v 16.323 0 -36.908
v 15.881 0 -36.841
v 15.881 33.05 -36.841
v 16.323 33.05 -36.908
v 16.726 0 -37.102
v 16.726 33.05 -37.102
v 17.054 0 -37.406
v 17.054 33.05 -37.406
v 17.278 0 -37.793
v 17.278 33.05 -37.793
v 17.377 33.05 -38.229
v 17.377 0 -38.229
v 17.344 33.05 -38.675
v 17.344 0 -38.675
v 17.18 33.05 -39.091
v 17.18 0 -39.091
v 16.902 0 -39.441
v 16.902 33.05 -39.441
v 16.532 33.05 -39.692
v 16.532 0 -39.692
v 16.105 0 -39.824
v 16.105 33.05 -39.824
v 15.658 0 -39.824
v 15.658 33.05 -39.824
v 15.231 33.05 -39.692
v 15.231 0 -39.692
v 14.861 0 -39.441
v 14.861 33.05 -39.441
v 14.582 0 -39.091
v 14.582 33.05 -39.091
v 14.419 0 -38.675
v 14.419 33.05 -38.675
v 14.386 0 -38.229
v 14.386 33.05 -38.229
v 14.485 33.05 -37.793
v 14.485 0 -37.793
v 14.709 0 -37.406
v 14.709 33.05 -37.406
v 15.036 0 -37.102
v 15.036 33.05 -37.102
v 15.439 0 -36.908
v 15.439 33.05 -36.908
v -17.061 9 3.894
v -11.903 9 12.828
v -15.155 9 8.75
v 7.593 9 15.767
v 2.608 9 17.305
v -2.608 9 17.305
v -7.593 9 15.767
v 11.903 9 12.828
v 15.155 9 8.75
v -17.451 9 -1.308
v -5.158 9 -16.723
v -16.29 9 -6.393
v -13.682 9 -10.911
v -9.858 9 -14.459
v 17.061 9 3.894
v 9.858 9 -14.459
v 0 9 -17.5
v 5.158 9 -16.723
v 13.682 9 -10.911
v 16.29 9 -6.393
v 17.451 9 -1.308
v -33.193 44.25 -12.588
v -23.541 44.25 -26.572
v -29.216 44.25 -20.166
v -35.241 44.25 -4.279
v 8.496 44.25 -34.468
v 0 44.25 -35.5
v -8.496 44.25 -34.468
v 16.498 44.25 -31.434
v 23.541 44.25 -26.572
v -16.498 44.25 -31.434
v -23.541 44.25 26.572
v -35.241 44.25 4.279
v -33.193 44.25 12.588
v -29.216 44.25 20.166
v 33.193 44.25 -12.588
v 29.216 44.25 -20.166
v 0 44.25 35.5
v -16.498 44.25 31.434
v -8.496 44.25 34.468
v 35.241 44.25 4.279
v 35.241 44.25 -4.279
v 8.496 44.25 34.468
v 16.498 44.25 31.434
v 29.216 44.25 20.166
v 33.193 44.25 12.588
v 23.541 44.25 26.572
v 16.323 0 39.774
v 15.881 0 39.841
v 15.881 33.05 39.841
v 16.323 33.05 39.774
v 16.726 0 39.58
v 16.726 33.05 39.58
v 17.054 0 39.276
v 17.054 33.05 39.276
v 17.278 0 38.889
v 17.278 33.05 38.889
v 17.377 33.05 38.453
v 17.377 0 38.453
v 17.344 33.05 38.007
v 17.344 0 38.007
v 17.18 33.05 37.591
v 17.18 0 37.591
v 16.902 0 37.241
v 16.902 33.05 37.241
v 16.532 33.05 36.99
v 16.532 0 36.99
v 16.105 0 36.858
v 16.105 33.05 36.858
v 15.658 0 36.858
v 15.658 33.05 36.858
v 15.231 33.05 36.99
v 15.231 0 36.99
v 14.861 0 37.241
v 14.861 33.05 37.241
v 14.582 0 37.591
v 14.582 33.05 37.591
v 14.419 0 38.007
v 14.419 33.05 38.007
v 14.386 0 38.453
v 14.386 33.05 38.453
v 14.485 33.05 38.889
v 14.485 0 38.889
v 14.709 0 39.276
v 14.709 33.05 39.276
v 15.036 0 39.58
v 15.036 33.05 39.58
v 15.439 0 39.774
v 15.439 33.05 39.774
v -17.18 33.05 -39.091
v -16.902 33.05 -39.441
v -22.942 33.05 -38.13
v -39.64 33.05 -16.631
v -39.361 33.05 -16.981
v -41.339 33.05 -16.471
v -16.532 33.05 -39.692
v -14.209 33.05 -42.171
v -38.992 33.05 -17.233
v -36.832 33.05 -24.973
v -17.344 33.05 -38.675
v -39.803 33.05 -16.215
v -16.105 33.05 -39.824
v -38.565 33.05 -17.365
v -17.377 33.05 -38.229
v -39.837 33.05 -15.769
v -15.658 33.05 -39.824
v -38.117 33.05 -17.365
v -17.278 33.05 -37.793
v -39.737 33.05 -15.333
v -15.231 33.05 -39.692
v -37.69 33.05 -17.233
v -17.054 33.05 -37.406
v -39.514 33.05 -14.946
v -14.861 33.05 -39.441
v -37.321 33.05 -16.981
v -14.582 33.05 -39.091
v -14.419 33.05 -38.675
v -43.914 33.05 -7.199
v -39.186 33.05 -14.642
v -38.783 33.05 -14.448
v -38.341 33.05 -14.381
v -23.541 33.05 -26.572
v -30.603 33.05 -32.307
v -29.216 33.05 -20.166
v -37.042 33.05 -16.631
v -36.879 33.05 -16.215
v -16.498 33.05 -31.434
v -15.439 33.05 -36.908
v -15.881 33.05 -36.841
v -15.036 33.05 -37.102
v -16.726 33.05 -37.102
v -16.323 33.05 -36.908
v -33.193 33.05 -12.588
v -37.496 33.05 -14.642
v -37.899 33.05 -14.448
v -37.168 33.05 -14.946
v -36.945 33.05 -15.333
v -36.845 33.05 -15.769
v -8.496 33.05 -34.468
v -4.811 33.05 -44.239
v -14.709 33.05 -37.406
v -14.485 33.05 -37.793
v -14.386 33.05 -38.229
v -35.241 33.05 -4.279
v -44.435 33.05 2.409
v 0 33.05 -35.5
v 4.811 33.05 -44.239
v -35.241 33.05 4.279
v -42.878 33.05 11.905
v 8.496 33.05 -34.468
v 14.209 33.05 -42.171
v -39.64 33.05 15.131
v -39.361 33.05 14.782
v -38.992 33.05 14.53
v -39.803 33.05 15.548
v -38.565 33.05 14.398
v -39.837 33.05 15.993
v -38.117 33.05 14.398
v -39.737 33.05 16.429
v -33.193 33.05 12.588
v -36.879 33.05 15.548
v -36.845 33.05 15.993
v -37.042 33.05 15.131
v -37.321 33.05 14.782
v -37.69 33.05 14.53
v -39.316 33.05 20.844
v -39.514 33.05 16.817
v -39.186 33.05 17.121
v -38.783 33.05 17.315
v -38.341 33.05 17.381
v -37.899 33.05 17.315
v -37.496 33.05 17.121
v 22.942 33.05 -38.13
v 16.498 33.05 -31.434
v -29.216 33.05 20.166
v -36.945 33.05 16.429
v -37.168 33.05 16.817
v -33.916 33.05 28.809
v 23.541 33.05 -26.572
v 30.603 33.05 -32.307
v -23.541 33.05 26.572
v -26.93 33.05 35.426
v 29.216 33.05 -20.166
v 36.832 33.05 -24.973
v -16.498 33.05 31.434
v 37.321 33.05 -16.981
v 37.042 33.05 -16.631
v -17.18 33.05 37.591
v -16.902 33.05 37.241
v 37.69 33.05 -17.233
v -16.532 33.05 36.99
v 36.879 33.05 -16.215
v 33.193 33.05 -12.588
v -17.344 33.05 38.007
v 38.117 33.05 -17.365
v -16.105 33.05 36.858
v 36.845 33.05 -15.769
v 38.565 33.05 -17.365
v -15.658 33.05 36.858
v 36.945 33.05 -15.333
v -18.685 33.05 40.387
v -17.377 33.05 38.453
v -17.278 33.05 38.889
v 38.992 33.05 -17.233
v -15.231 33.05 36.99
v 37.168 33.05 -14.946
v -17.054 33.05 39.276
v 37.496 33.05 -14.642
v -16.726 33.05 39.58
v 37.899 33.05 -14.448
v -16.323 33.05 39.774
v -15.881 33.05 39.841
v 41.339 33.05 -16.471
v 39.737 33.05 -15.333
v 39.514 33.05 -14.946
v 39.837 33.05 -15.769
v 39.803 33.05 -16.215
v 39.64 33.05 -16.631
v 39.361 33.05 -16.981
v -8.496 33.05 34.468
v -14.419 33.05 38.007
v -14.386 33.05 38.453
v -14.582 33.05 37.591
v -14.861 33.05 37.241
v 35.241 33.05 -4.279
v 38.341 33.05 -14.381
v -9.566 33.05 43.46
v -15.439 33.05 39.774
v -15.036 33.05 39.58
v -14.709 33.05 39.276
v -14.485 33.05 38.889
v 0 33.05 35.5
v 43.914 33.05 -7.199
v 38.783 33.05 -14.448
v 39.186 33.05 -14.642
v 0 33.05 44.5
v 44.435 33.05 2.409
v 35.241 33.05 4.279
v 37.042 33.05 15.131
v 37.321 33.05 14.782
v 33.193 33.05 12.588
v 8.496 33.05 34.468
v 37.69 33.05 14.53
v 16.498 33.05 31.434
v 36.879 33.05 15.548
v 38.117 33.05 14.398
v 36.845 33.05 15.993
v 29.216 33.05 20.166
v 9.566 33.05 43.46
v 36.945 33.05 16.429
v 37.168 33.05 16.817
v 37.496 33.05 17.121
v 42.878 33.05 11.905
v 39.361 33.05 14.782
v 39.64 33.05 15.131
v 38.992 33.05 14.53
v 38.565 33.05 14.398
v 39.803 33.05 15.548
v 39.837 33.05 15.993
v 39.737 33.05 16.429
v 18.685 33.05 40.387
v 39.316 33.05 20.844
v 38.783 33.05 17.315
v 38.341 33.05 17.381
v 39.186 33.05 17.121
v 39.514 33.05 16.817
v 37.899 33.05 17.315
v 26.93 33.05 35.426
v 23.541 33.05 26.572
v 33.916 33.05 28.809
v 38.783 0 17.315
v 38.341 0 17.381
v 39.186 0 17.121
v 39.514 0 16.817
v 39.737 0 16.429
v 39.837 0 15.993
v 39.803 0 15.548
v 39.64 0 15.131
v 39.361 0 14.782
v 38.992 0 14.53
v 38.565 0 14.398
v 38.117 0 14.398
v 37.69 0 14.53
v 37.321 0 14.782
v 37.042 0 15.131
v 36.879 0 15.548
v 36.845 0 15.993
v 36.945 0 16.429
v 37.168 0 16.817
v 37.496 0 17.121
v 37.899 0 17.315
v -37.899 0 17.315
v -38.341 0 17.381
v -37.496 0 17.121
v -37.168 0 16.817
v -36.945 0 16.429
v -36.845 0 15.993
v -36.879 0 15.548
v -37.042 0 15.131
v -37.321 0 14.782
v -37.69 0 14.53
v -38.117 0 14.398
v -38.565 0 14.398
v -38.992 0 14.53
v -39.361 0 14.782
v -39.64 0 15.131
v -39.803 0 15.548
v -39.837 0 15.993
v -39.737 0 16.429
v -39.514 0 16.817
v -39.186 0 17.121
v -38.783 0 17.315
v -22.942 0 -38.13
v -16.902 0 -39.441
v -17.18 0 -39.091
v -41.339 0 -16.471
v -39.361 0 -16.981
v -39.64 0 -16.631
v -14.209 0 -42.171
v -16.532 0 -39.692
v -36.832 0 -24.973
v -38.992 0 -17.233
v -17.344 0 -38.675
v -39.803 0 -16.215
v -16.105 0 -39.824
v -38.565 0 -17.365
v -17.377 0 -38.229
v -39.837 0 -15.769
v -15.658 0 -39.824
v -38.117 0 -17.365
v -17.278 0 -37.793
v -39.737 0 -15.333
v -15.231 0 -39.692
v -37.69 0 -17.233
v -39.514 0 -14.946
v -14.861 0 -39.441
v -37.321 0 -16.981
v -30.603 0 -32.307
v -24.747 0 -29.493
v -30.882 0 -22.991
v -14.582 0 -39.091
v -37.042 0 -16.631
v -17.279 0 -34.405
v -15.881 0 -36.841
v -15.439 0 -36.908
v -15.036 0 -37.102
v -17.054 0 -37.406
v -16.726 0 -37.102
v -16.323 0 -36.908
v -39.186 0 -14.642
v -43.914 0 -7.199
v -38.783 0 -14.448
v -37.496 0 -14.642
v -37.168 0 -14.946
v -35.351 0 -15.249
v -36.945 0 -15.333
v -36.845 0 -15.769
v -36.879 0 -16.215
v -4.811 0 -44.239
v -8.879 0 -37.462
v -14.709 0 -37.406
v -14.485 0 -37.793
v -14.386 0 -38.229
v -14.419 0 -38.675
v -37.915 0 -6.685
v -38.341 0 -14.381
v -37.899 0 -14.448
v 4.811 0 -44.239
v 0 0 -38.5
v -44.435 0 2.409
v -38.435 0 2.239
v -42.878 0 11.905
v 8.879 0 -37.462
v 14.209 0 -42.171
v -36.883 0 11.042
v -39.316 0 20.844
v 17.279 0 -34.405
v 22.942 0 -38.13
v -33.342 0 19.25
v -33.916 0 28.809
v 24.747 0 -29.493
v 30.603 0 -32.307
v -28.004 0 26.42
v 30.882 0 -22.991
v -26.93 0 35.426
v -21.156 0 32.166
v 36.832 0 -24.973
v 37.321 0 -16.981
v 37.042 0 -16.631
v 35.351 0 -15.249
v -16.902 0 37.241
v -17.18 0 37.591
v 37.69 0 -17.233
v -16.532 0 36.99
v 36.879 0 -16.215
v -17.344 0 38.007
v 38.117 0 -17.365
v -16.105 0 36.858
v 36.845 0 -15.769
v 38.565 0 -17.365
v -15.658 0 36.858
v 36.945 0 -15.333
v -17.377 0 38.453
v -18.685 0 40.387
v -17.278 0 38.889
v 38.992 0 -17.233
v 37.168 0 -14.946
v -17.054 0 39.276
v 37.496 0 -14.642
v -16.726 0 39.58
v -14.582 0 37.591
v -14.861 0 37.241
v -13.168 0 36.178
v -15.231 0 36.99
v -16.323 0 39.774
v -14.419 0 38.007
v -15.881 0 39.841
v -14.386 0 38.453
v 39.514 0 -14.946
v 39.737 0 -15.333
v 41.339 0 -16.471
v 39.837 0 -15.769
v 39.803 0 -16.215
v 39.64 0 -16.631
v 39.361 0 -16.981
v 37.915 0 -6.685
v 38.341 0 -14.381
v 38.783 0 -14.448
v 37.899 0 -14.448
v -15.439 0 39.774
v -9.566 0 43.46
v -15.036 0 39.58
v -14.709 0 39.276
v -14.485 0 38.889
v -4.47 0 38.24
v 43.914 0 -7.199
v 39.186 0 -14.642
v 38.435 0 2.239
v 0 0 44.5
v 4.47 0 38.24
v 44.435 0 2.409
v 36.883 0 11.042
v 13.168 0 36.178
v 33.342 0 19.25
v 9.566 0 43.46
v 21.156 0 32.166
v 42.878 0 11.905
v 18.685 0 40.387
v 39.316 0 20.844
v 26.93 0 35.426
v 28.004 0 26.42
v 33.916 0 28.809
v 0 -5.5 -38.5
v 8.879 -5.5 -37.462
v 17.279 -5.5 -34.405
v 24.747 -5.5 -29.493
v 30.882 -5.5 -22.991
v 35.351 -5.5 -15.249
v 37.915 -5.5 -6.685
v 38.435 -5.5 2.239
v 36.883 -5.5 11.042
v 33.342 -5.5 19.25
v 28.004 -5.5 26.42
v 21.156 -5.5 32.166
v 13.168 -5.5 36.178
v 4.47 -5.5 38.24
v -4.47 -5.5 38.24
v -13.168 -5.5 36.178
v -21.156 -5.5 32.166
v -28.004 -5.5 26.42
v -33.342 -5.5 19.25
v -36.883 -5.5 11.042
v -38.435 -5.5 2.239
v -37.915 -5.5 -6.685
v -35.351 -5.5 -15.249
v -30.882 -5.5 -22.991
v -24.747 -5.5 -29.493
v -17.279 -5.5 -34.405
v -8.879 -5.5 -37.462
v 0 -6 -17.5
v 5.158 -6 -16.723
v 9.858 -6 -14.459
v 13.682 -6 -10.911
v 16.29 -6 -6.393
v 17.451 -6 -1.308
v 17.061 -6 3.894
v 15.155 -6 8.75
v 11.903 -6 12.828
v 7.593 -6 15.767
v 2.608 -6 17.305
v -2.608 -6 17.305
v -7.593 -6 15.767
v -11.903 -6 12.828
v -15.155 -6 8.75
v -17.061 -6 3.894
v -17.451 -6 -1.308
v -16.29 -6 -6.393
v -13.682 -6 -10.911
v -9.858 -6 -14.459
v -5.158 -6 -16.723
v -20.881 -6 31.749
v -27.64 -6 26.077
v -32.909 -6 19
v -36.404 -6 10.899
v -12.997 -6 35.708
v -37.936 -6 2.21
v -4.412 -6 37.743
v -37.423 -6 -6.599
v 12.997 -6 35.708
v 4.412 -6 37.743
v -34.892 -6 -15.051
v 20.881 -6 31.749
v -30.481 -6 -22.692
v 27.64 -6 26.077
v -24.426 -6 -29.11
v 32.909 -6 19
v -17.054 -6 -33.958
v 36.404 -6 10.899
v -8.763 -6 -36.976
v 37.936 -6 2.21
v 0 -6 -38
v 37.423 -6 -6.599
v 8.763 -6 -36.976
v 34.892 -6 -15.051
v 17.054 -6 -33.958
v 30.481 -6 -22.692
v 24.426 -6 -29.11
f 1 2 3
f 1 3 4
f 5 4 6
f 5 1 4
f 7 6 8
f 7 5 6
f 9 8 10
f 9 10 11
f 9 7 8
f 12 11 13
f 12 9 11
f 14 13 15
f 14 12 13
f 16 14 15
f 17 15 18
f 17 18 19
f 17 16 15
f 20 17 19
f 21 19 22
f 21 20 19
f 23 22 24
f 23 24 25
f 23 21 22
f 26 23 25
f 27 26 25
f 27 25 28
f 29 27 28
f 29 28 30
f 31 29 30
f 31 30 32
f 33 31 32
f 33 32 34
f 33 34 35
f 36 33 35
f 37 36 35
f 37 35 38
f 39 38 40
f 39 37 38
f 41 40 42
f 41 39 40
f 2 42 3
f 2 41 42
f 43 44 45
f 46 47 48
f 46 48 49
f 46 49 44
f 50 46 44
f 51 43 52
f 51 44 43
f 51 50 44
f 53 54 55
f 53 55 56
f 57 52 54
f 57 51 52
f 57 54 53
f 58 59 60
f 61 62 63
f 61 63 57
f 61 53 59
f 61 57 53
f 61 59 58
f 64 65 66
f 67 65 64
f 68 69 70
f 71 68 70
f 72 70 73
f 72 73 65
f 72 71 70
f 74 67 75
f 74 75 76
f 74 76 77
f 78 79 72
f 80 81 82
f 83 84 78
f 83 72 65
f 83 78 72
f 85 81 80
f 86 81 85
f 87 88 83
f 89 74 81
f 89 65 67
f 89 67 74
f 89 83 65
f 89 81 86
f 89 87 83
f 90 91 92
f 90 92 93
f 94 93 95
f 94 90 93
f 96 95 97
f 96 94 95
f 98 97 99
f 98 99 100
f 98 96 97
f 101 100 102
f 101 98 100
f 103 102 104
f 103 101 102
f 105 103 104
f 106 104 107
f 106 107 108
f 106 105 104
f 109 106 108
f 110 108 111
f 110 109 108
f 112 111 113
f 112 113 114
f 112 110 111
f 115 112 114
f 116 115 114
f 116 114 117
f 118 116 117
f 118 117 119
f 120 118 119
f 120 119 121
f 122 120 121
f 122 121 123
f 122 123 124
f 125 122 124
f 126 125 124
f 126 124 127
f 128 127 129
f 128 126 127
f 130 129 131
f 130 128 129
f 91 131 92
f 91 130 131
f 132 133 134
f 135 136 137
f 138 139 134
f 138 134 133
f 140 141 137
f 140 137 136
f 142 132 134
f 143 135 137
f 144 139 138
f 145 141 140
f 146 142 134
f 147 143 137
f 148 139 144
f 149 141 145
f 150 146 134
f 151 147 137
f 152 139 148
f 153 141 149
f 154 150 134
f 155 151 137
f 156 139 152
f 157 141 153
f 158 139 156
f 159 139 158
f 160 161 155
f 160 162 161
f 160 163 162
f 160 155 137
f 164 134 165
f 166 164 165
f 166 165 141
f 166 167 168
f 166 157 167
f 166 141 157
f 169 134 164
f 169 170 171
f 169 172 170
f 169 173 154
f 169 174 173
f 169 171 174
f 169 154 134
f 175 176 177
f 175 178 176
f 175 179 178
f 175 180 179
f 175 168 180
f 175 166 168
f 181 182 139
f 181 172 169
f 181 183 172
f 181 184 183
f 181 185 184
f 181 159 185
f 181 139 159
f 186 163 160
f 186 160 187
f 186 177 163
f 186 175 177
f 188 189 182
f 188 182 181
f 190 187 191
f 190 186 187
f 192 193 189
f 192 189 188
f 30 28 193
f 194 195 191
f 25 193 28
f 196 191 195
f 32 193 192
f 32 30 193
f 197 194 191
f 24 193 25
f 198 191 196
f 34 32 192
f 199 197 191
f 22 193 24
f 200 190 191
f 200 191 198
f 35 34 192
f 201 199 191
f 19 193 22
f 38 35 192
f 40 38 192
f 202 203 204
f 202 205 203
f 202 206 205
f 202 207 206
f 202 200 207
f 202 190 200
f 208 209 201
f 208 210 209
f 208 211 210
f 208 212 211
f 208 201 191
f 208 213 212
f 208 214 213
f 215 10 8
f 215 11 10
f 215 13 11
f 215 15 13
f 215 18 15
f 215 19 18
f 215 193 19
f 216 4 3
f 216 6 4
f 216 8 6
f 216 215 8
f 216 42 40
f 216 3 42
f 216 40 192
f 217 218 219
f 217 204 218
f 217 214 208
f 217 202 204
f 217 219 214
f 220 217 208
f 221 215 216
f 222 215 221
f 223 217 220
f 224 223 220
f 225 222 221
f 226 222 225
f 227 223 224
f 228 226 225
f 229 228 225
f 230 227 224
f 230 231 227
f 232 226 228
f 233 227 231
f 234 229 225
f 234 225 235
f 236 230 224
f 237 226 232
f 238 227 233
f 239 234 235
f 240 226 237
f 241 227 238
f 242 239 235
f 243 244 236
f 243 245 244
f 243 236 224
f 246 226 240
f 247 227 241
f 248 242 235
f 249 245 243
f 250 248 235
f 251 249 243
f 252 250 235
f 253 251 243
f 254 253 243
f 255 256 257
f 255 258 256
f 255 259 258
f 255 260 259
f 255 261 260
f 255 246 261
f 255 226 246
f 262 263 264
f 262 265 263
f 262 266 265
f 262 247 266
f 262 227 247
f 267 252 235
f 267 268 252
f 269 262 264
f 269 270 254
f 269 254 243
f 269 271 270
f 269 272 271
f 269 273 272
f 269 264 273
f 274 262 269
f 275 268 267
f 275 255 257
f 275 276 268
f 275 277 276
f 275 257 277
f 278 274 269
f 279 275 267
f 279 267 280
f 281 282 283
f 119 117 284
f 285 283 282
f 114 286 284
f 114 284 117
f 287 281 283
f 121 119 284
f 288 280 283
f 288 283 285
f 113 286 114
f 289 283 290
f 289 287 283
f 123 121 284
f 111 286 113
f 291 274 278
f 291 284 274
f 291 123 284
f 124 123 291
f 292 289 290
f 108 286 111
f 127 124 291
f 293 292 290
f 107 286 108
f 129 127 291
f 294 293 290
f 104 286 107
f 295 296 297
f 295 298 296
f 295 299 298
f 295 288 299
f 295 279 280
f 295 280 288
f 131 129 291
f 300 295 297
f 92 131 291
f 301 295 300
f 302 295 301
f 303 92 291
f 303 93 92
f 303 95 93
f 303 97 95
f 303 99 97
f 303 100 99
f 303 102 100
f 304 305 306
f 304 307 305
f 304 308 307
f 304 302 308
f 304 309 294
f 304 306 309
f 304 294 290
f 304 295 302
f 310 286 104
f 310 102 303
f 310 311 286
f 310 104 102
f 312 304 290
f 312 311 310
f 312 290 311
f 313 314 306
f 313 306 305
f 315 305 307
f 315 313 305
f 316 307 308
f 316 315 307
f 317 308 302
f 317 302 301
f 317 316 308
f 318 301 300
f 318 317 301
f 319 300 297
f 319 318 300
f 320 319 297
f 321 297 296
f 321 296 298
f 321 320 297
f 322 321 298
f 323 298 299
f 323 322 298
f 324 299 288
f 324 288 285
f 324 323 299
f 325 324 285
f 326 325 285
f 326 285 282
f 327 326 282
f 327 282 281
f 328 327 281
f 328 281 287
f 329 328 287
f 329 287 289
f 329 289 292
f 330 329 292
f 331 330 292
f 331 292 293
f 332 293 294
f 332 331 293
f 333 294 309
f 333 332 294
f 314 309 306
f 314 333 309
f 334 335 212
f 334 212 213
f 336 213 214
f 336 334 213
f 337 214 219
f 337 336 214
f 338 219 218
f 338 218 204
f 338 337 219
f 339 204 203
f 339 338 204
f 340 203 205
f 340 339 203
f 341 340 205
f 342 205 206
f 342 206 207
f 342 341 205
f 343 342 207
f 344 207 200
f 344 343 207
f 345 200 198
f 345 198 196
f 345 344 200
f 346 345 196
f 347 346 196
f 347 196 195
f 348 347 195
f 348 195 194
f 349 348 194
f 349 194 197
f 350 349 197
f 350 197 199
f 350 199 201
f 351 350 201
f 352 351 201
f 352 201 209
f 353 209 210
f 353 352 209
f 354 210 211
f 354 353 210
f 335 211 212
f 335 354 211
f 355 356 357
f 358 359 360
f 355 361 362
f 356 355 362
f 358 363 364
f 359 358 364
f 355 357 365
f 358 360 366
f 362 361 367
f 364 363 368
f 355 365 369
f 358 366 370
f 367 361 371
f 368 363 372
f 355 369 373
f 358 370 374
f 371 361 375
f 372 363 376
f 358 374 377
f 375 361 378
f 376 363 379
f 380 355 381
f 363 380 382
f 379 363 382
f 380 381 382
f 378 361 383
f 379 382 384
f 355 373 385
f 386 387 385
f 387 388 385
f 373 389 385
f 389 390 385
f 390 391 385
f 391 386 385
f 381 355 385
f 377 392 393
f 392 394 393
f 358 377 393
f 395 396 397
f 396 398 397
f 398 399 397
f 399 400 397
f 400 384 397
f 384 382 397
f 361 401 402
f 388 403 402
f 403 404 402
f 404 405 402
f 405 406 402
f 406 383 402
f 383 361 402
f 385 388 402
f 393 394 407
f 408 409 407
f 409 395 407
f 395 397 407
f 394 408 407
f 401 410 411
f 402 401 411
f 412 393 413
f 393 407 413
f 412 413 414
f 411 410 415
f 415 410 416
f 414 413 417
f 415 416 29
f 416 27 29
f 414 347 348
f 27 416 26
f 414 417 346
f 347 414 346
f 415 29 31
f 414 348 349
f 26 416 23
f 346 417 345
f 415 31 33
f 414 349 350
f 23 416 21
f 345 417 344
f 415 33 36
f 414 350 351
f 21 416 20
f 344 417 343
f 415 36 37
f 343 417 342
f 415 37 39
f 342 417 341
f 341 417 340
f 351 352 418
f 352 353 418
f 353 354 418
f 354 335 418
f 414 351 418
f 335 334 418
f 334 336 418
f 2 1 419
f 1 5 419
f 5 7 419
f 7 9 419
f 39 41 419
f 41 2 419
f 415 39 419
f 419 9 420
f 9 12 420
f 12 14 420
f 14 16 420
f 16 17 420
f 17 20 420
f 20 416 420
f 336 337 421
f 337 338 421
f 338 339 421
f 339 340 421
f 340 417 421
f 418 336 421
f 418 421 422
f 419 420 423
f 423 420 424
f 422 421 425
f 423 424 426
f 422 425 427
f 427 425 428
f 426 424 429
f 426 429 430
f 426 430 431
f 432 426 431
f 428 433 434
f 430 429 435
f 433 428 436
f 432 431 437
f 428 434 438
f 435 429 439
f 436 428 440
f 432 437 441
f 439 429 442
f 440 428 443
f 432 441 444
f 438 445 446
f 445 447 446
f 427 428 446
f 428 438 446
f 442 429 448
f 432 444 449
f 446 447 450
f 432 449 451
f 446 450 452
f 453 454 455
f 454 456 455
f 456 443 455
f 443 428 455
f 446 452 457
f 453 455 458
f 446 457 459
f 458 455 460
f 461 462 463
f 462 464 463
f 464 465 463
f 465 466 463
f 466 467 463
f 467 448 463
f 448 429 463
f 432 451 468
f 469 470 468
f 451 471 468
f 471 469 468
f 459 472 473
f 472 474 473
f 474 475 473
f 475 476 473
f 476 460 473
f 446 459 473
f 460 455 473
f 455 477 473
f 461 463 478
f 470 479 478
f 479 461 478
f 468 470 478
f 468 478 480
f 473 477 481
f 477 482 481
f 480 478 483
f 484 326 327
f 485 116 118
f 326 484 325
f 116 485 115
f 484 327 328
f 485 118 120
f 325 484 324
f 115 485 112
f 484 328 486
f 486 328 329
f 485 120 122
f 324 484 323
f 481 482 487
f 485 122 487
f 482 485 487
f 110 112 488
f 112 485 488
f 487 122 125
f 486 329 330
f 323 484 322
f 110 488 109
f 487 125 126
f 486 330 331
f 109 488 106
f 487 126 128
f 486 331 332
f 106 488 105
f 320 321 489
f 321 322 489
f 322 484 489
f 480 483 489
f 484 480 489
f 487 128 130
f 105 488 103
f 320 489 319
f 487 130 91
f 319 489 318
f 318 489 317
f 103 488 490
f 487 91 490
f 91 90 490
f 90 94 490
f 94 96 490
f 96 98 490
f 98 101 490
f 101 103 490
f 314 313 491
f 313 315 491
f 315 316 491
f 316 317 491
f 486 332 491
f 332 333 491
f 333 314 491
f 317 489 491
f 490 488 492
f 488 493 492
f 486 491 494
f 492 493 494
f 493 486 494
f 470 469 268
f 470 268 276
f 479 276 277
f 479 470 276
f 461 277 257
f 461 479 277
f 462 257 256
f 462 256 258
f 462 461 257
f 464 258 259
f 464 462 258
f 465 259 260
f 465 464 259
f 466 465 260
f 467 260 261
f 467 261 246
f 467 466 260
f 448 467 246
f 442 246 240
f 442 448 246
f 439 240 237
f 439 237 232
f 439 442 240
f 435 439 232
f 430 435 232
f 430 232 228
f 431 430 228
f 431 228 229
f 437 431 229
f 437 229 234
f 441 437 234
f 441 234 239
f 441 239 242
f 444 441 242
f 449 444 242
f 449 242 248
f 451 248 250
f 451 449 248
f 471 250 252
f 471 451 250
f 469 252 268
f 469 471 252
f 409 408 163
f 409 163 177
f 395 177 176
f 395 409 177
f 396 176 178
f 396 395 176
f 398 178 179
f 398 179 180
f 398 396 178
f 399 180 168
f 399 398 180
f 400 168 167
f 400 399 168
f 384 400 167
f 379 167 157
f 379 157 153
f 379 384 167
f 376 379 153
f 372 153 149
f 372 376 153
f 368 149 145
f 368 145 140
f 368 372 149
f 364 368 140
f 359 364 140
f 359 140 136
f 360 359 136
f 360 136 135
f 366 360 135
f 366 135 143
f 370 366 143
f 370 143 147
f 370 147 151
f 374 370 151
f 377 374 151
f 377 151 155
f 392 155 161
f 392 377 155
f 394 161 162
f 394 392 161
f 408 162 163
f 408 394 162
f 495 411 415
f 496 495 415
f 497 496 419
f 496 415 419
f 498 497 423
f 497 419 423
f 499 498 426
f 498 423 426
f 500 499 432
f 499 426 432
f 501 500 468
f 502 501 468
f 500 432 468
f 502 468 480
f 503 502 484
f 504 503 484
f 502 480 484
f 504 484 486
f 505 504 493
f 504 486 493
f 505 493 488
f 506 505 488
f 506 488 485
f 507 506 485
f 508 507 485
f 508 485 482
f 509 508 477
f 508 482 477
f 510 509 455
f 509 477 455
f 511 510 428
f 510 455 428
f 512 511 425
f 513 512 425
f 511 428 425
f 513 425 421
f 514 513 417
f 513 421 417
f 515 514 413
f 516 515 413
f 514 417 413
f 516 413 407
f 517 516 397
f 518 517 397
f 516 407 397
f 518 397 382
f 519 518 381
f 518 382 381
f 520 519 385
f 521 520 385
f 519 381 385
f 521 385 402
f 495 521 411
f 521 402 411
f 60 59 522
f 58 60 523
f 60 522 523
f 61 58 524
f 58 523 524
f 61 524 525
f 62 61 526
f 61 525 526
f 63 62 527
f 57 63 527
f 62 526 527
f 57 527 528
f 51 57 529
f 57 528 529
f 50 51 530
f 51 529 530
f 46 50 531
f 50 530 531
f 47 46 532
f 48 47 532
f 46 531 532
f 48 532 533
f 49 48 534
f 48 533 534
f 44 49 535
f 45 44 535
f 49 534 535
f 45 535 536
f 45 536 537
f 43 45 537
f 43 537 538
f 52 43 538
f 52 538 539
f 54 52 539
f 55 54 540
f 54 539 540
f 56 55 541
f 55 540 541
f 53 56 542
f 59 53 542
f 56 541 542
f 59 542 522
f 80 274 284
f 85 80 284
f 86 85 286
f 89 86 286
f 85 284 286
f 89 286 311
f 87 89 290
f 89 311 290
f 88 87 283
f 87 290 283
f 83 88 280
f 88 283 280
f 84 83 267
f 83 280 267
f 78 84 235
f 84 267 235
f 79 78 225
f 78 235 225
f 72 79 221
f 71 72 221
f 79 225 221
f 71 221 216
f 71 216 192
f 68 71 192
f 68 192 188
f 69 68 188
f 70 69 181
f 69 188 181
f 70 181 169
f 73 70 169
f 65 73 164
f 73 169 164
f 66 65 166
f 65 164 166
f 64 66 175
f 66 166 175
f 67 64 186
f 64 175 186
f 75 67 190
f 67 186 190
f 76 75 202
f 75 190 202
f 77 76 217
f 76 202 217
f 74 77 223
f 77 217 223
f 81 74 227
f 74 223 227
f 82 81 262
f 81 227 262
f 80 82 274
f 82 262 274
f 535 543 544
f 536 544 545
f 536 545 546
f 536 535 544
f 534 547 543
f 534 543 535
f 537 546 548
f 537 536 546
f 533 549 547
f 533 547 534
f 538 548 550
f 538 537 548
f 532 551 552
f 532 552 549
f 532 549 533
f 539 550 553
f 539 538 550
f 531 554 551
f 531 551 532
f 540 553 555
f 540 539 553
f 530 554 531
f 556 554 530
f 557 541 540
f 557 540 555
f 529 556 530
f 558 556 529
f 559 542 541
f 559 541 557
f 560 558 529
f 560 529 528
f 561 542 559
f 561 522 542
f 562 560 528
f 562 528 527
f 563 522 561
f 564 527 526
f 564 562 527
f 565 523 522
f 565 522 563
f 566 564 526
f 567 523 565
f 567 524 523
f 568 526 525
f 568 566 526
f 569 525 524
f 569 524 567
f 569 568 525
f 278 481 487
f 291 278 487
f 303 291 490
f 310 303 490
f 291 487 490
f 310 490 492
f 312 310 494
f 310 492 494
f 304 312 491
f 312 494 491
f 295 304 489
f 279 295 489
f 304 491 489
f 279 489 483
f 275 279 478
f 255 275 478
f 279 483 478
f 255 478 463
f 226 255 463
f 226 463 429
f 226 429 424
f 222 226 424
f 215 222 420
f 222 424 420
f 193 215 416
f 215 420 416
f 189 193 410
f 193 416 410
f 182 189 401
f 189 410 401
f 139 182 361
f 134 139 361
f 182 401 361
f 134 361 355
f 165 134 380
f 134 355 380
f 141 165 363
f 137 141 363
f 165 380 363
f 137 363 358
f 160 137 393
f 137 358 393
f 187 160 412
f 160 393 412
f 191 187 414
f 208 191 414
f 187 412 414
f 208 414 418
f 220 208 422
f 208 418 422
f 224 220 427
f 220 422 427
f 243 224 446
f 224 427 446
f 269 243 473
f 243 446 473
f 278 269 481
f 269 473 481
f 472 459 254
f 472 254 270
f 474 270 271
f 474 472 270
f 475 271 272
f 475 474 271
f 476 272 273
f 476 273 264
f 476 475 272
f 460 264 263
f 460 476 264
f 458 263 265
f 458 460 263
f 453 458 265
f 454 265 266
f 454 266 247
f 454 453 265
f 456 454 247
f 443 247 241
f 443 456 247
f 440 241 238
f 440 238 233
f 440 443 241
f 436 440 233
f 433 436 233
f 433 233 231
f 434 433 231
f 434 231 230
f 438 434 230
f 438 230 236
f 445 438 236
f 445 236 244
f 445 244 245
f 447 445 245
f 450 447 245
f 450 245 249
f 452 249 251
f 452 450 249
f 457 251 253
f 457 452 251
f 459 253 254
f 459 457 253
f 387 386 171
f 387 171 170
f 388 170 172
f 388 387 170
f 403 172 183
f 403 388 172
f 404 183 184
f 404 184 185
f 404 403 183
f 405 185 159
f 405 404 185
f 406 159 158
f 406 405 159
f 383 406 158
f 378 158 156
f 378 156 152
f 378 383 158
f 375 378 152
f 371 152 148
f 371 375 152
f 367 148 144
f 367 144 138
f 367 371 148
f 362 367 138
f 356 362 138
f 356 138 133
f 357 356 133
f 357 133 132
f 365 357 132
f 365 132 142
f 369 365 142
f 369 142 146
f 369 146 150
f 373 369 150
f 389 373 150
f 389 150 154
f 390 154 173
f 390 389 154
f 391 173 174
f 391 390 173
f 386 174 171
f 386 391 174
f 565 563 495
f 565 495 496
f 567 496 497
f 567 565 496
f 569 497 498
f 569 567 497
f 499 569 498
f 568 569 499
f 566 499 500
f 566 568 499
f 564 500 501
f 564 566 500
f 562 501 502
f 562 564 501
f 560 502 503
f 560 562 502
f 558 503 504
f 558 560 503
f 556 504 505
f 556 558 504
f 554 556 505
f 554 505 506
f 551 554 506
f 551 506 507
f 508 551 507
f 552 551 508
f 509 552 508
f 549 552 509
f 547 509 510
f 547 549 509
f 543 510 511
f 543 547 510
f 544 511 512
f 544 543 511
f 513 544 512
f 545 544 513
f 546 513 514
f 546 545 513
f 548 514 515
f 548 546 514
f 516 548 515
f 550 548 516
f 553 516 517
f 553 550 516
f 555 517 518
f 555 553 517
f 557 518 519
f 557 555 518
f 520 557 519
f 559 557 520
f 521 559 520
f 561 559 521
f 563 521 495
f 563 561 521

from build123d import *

# Parameters (mm, degrees)
SKETCH_1_R          = 44.5
SKETCH_1_R_2        = 1.5
EXTRUDE_1_DEPTH     = 33.05
SKETCH_2_R          = 35.5
EXTRUDE_2_DEPTH     = 11.2
SKETCH_3_R          = 38.5
EXTRUDE_3_DEPTH     = 6
CHAMFER_1_SIZE      = 0.5
SKETCH_5_R          = 17.5
CUT_EXTRUDE_1_DEPTH = 15


with BuildPart() as part:
    # Эскиз1 → Бобышка-Вытянуть1 (new body)
    with BuildSketch(Plane(origin=(0, 0, 0), x_dir=(1, 0, 0), z_dir=(0, 1, 0))):
        with Locations(Location((0, 0, 0), (0, 0, 270))):
            Circle(SKETCH_1_R)
        with Locations(Location((15.881362443, 38.341000599, 0), (0, 0, 270))):
            Circle(SKETCH_1_R_2, mode=Mode.SUBTRACT)
        with Locations(Location((38.341000599, 15.881362443, 0), (0, 0, 270))):
            Circle(SKETCH_1_R_2, mode=Mode.SUBTRACT)
        with Locations(Location((38.341000599, -15.881362443, 0), (0, 0, 270))):
            Circle(SKETCH_1_R_2, mode=Mode.SUBTRACT)
        with Locations(Location((15.881362443, -38.341000599, 0), (0, 0, 270))):
            Circle(SKETCH_1_R_2, mode=Mode.SUBTRACT)
        with Locations(Location((-15.881362443, -38.341000599, 0), (0, 0, 270))):
            Circle(SKETCH_1_R_2, mode=Mode.SUBTRACT)
        with Locations(Location((-38.341000599, -15.881362443, 0), (0, 0, 270))):
            Circle(SKETCH_1_R_2, mode=Mode.SUBTRACT)
        with Locations(Location((-38.341000599, 15.881362443, 0), (0, 0, 270))):
            Circle(SKETCH_1_R_2, mode=Mode.SUBTRACT)
        with Locations(Location((-15.881362443, 38.341000599, 0), (0, 0, 270))):
            Circle(SKETCH_1_R_2, mode=Mode.SUBTRACT)
    extrude(amount=EXTRUDE_1_DEPTH)

    # Эскиз2 → Бобышка-Вытянуть2 (add)
    with BuildSketch(Plane(origin=(0, 33.05, 0), x_dir=(1, 0, 0), z_dir=(0, 1, 0))):
        with Locations(Location((0, 0, 0), (0, 0, 270))):
            Circle(SKETCH_2_R)
    extrude(amount=EXTRUDE_2_DEPTH)

    # Эскиз3 → Бобышка-Вытянуть3 (add)
    with BuildSketch(Plane.XZ):
        with Locations(Location((0, 0, 0), (0, 0, 270))):
            Circle(SKETCH_3_R)
    extrude(amount=EXTRUDE_3_DEPTH)

    # Фаска1
    chamfer_1_edges = [part.edges().sort_by_distance(p)[0] for p in [
        (0, -6, 38.5),
    ]]
    chamfer(chamfer_1_edges, length=CHAMFER_1_SIZE)

    # Эскиз5 → Вырез-Вытянуть1 (cut)
    with BuildSketch(Plane.XZ.offset(6)):
        with Locations(Location((0, 0, 0), (0, 0, 270))):
            Circle(SKETCH_5_R)
    extrude(amount=-CUT_EXTRUDE_1_DEPTH, mode=Mode.SUBTRACT)


solid = part.part
